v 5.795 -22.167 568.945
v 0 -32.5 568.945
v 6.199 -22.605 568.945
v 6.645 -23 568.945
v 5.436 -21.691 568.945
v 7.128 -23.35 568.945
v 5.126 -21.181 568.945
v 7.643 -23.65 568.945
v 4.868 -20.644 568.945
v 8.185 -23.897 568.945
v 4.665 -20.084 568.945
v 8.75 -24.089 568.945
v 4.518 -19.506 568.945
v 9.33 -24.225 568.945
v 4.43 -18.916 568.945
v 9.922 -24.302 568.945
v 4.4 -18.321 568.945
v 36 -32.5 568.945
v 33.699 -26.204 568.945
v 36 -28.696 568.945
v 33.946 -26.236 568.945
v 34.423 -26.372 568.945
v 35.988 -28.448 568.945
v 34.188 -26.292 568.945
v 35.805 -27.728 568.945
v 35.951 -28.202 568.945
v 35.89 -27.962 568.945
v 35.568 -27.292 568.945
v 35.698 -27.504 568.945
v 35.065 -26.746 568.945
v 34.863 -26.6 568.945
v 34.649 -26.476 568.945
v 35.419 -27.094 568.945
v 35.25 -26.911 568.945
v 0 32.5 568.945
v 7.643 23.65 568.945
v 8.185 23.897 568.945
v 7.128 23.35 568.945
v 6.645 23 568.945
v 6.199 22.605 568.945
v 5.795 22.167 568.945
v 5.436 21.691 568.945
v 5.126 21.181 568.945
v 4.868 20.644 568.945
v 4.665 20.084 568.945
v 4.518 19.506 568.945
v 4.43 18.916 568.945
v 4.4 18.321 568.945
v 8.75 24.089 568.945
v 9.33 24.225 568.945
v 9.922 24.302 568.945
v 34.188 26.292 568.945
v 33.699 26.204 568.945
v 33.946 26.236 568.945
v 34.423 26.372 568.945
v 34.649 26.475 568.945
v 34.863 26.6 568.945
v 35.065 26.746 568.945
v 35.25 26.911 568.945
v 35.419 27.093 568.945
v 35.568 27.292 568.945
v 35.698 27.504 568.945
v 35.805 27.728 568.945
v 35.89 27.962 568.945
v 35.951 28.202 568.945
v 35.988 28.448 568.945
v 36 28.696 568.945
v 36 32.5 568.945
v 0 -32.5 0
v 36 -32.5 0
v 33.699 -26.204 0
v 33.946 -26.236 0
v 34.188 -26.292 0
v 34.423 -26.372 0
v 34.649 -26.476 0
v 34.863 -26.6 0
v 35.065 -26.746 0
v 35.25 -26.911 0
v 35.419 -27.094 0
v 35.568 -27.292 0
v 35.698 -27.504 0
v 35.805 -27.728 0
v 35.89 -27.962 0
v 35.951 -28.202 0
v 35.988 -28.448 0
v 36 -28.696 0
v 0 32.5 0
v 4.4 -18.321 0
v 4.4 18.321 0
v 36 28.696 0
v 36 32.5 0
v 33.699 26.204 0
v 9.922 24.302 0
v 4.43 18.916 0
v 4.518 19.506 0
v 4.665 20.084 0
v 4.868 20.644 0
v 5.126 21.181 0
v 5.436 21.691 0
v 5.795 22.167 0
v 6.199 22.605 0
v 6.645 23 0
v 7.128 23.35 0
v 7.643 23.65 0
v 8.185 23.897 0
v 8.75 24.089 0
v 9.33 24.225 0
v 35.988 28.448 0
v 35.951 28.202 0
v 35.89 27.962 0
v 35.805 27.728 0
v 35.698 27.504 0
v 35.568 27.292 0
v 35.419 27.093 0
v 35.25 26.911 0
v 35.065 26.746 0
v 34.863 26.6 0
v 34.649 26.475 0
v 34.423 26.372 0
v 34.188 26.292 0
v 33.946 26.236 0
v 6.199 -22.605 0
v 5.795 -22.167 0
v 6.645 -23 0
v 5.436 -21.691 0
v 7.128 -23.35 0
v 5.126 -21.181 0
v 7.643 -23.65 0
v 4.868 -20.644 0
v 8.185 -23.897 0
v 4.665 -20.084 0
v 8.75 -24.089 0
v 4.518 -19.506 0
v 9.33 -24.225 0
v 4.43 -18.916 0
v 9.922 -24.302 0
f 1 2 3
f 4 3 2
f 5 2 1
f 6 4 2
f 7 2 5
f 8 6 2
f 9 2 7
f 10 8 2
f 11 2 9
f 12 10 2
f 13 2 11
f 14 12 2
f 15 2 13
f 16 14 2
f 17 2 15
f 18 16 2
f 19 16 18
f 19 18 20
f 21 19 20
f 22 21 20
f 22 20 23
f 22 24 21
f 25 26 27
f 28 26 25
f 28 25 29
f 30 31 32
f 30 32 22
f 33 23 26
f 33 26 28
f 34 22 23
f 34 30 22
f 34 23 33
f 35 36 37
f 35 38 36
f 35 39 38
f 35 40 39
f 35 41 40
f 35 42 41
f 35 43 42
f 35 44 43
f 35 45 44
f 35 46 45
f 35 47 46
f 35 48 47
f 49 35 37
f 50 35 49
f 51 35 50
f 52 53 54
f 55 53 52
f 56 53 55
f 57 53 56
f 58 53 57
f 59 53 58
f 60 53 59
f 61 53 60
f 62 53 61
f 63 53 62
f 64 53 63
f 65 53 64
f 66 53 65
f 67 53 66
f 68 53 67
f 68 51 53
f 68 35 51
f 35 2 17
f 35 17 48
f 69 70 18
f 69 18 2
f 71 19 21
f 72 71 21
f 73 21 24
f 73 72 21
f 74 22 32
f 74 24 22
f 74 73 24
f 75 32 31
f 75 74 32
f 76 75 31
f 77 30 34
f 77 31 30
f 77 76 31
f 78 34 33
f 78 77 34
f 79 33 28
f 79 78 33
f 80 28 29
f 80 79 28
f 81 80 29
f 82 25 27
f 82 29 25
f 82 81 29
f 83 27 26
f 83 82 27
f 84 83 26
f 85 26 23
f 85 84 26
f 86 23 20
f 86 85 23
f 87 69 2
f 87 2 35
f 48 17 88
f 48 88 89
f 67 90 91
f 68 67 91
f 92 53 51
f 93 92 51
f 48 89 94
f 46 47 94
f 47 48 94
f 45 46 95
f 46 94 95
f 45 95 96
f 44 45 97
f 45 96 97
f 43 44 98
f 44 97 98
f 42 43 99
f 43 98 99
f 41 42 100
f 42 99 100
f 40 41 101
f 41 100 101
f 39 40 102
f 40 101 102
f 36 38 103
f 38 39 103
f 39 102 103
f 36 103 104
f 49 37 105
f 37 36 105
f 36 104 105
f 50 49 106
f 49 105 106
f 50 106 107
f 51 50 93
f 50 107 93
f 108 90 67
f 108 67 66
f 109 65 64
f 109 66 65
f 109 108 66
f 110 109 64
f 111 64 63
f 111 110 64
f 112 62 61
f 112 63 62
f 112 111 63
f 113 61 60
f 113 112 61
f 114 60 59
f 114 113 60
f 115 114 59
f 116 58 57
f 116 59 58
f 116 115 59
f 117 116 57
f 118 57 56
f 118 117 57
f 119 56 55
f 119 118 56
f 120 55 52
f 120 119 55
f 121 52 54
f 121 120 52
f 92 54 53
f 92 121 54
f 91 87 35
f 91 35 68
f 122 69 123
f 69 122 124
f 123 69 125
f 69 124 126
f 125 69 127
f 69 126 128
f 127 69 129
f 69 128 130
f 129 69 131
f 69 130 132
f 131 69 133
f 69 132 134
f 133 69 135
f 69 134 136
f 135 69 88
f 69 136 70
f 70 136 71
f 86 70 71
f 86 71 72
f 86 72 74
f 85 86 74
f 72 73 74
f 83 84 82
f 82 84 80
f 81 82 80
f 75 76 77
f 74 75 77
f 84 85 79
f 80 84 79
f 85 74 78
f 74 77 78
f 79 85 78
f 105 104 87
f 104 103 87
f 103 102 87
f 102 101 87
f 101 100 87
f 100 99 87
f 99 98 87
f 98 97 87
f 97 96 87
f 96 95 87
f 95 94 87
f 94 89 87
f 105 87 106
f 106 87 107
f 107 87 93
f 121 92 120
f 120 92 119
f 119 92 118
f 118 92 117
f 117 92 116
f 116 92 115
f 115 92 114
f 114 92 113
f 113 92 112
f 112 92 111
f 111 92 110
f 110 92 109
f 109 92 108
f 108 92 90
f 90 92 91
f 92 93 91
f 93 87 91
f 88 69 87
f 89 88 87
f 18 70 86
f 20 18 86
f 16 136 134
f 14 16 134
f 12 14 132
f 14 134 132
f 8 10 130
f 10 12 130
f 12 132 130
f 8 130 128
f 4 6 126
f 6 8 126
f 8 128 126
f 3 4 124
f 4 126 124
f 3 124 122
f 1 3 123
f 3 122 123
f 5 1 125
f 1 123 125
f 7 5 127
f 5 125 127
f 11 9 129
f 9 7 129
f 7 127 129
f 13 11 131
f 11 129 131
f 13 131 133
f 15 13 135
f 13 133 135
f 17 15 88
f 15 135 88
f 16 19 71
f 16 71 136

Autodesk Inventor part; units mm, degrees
ref_plane "Начальная плоскость" through (0, 0, 0) normal (0, 0, 1) x (1, 0, 0)
ref_plane "Конечная плоскость" through (0, 0, 568.945) normal (0, 0, 1) x (1, 0, 0)
sketch "Эскиз" plane through (0, 0, 0) normal (0, 0, 1) x (1, 0, 0)
  line L0 (36, -32.5) -> (0, -32.5)
  line L1 (36, -32.5) -> (36, -28.696)
  line L2 (33.6994, -26.2039) -> (9.9215, -24.3017)
  line L3 (4.4, -18.3208) -> (4.4, 18.3208)
  line L4 (33.6994, 26.2039) -> (9.9215, 24.3017)
  line L5 (36, 28.696) -> (36, 32.5)
  line L6 (0, 32.5) -> (36, 32.5)
  line L7 (0, -32.5) -> (0, 32.5)
  arc A0 (4.4, -18.3208) -> (9.9215, -24.3017) centre (10.4, -18.3208) ccw
  arc A1 (9.9215, 24.3017) -> (4.4, 18.3208) centre (10.4, 18.3208) ccw
  arc A2 (36, -28.696) -> (33.6994, -26.2039) centre (33.5, -28.696) ccw
  arc A3 (33.6994, 26.2039) -> (36, 28.696) centre (33.5, 28.696) ccw
  line L8 (0, 45.5) -> (0, -45.5) construction
  line L9 (-7.2974, 0) -> (43.7847, 0) construction
  point P0 (36, -26.388)
  point P1 (4.4, -23.86)
  point P2 (4.4, 23.86)
  point P3 (36, 26.388)
  dimension "d3" = 36
  dimension "d5" = 4.4
  dimension "d7" = 65
  dimension "d9" = 8.64
  dimension "d11" = 8.64
  dimension "d13" = 6.112
  dimension "d15" = 6.112
  dimension "d22" = 6
  dimension "d23" = 2.5
  dimension "d24" = 32.5
  dimension "d25" = 0
extrude "Тело" add sketch "Эскиз" along normal up to surface (568.945 mm away) from surface at 0
sketch "Sketch3" plane through (0, 0, 0) normal (0, 0, 1) x (1, 0, 0)
  line L0 (0, 0) -> (10, 0)
ref_plane "Work Plane7" through (0, 0, 0) normal (0, -1, 0) x (1, 0, 0)
sketch "Sketch4" plane through (0, 0, 0) normal (0, -1, 0) x (1, 0, 0)
  line L0 (-2, 0) -> (12, 0)
  line L1 (-2, 568.945) -> (12, 568.945)
  dimension "d29" = 568.945
ref_plane "РабПлоскость8" through (32.5, 32.5, 568.945) normal (0, 0, 1) x (1, 0, 0)
split "Разделение1" plane through (32.5, 32.5, 568.945) removes the side toward (0, 0, 1)
equation "\"d3\" = b"
equation "\"d5\" = t1"
equation "\"d7\" = ParH"
equation "\"d9\" = msp_x1 + t2"
equation "\"d11\" = msp_x1 + t2"
equation "\"d13\" = -msp_x2 + t2"
equation "\"d15\" = -msp_x2 + t2"
equation "\"d22\" = R"
equation "\"d23\" = R1"
equation "\"d24\" = 0.5 * d7"
equation "\"d16\" = G_L"
equation "\"R1\" = 2.5"
equation "\"R\" = 6"
equation "\"t1\" = 4.4"
equation "\"t2\" = 7.2"
equation "\"ParH\" = 65"
equation "\"b\" = 36"
equation "\"msp_x1\" = 0.04 * b"
equation "\"msp_x2\" = -0.08 * t1 + 0.04 * b"
equation "\"G_L\" = d29"
equation "\"ex\" = 0"
equation "\"G_OFFSET_START\" = 0"
equation "\"G_OFFSET_END\" = -36"
equation "\"d27\" = G_OFFSET_END + B_L"
equation "\"B_L\" = 604.945"
properties part number "Швеллер 6.5U-568,95 ГОСТ 8240-97"
